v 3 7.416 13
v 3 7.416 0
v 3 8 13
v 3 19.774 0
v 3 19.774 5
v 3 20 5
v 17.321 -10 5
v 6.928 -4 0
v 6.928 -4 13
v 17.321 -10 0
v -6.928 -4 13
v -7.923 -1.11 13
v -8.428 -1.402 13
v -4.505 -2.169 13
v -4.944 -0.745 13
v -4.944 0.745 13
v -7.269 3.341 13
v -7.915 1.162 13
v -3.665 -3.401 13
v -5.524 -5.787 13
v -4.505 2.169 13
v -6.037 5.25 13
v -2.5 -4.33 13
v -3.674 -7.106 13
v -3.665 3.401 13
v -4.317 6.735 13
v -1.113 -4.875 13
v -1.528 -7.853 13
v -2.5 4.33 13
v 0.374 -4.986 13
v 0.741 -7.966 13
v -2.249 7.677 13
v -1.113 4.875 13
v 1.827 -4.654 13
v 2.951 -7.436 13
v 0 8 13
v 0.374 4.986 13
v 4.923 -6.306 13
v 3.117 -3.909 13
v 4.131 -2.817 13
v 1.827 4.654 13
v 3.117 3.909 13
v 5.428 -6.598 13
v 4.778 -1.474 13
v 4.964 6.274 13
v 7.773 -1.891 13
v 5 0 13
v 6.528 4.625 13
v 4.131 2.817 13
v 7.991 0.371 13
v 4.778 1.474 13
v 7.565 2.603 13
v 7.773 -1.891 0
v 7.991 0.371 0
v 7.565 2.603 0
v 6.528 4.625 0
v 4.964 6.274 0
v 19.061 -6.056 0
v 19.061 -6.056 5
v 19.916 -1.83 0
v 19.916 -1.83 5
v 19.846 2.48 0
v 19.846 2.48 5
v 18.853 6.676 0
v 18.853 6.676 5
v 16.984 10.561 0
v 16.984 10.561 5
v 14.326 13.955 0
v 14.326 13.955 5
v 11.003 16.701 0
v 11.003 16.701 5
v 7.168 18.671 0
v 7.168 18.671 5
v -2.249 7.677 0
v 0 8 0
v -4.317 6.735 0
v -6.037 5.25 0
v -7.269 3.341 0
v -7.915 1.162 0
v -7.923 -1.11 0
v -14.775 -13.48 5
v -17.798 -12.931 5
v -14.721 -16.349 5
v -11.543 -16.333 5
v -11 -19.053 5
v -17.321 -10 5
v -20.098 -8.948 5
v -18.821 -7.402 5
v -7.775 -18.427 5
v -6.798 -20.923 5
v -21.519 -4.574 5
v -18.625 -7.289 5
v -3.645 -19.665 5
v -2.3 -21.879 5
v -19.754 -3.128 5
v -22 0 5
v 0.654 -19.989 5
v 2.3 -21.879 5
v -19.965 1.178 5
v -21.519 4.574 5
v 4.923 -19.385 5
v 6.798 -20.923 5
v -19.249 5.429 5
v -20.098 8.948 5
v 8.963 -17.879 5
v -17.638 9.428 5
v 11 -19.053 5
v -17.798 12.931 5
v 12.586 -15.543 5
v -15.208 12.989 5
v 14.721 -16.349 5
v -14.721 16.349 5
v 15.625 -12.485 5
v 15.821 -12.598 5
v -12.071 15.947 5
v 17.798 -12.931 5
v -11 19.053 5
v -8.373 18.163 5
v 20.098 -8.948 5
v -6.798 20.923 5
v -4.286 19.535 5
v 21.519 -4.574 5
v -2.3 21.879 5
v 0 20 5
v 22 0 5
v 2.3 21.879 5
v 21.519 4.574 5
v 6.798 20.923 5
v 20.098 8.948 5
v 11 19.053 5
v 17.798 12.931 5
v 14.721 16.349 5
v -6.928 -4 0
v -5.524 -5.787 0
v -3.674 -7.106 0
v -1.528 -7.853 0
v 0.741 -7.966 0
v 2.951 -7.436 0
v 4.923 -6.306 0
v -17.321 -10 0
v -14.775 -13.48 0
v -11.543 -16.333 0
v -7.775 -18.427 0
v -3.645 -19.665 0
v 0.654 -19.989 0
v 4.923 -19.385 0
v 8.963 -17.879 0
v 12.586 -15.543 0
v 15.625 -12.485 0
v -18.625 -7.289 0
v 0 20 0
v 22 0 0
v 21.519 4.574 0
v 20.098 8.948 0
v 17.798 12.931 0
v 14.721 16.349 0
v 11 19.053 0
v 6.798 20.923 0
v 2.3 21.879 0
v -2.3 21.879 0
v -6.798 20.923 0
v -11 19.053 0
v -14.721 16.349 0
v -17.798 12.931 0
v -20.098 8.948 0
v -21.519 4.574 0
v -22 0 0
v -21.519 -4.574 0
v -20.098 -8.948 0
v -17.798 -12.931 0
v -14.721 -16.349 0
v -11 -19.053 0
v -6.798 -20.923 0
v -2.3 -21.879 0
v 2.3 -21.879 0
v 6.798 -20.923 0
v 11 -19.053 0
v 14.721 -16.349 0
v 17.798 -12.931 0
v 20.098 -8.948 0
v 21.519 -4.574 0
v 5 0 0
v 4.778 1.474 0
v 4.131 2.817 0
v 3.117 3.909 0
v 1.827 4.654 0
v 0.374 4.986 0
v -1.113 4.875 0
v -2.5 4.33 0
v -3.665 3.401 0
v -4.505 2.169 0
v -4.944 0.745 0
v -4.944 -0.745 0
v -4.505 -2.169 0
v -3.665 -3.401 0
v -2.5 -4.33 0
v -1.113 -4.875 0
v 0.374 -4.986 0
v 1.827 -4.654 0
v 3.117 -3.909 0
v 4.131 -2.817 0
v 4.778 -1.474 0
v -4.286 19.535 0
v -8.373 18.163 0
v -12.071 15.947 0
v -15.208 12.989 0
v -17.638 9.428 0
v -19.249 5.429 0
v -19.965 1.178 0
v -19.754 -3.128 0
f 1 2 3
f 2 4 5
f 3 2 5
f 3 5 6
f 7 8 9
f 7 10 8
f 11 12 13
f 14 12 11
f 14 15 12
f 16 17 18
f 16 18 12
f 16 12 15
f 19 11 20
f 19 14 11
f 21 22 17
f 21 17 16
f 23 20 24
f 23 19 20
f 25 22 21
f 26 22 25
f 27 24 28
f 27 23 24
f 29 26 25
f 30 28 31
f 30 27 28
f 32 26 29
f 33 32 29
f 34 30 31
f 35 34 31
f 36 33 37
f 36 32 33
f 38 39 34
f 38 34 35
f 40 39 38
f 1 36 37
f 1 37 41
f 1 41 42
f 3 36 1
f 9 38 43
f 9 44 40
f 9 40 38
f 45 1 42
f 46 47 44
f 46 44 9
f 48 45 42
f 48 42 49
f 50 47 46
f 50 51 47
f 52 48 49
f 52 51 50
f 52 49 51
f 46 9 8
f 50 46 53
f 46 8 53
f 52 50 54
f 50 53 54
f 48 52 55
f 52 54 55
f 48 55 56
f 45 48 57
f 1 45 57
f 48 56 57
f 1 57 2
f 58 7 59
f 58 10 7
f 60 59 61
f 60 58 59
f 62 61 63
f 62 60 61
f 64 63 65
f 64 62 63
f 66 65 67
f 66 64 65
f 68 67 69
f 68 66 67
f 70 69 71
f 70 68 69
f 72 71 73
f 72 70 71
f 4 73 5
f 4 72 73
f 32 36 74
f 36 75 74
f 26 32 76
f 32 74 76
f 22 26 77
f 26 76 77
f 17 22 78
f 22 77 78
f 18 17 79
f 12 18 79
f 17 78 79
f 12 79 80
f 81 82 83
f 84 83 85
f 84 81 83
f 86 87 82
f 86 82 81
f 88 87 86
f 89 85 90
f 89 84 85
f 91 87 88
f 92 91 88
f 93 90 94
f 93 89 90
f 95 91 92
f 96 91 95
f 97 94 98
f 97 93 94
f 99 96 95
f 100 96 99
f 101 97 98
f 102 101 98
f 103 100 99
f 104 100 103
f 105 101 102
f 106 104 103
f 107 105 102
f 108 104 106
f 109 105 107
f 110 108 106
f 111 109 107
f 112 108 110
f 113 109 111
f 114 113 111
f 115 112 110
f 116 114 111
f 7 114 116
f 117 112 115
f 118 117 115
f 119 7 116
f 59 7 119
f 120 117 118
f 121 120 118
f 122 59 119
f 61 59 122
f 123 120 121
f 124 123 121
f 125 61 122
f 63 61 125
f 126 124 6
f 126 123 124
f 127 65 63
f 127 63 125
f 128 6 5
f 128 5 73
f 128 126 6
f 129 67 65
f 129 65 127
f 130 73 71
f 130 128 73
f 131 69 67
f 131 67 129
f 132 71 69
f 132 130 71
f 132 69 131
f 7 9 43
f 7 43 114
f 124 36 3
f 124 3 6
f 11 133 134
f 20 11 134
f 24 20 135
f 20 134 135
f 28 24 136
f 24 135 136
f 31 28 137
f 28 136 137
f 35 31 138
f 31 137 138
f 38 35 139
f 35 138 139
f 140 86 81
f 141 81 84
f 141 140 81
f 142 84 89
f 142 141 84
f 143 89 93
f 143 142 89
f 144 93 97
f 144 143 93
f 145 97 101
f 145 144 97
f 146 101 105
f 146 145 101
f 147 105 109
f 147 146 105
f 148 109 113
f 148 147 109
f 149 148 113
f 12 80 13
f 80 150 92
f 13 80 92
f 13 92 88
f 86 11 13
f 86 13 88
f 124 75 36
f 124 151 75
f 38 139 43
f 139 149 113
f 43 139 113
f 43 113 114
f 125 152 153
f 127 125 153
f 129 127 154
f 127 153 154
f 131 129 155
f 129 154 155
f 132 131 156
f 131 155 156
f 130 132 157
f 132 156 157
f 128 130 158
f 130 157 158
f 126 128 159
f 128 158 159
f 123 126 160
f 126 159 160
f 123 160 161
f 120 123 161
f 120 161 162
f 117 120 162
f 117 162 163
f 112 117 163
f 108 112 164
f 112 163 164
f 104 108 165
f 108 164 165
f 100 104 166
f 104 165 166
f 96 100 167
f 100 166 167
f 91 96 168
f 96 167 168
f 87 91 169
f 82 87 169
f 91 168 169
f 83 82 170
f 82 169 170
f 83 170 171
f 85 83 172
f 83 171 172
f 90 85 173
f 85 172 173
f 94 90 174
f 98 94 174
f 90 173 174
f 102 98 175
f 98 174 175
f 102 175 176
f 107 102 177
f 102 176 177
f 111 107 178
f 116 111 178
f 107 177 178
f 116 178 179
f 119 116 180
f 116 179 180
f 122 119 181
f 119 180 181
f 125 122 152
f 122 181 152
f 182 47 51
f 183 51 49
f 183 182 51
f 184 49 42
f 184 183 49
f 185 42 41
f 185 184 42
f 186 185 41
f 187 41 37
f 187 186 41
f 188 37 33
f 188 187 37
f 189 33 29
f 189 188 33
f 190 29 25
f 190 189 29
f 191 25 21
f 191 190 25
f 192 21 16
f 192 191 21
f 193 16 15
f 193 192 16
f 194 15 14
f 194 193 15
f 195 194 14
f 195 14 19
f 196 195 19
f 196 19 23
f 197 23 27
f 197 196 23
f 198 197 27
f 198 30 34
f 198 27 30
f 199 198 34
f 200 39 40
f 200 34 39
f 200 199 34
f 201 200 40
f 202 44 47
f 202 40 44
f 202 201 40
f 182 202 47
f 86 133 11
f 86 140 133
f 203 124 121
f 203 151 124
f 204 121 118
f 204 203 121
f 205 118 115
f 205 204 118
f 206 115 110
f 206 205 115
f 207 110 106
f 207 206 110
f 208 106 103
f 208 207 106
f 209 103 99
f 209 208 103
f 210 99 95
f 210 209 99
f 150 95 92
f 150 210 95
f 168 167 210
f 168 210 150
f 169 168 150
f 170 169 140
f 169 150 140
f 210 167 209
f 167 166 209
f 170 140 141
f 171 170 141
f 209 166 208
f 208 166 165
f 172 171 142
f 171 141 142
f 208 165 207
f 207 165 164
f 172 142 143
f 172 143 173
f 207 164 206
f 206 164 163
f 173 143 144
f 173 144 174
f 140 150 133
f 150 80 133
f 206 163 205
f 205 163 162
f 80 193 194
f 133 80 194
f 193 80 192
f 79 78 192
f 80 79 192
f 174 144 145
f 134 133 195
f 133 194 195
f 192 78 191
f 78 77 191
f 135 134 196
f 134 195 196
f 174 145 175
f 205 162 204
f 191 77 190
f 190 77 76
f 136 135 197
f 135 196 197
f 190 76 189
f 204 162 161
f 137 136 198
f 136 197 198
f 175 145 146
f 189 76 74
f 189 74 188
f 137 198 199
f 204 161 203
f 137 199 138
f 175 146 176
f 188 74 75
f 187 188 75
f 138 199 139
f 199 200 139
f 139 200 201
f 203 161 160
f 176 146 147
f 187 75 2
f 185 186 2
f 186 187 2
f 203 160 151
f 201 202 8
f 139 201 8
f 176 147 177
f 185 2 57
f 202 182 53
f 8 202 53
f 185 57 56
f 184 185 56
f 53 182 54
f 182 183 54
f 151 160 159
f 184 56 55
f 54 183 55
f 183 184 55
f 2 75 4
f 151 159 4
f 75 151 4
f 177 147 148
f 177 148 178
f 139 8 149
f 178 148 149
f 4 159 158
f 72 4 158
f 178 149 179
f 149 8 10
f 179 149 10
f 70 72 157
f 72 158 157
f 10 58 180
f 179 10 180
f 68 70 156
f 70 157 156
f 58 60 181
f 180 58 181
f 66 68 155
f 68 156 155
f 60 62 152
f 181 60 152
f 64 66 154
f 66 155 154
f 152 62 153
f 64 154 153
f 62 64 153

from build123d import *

# Parameters (mm, degrees)
SKETCH7_R            = 22
SKETCH7_R_2          = 20
BOSS_EXTRUDE7_DEPTH  = 5
SKETCH8_R            = 8
SKETCH8_R_2          = 5
BOSS_EXTRUDE8_DEPTH  = 13
BOSS_EXTRUDE10_DEPTH = 3
CIRPATTERN2_COUNT    = 3


with BuildPart() as part:
    # Sketch7 → Boss-Extrude7 (new body)
    with BuildSketch(Plane.XY):
        Circle(SKETCH7_R)
        Circle(SKETCH7_R_2, mode=Mode.SUBTRACT)
    extrude(amount=BOSS_EXTRUDE7_DEPTH)



with BuildPart() as body_2:
    # Sketch8 → Boss-Extrude8 (new body)
    with BuildSketch(Plane.XY):
        Circle(SKETCH8_R)
        Circle(SKETCH8_R_2, mode=Mode.SUBTRACT)
    extrude(amount=BOSS_EXTRUDE8_DEPTH)


with BuildPart() as part_1:
    add(part.part)

    add(body_2.part)  # Boss-Extrude10 merges body 2
    # Sketch9 → Boss-Extrude10 (add)
    with BuildSketch(Plane(origin=(0, 0, 0), x_dir=(0, 0, -1), z_dir=(1, 0, 0))):
        Polygon((-13, 8), (-5, 20), (0, 20), (0, 8), (0, 5), (-13, 5), align=None)
    boss_extrude10 = extrude(amount=BOSS_EXTRUDE10_DEPTH)

    # CirPattern2: Boss-Extrude10 ×3 about axis
    cirpattern2_axis = Axis((0, 0, 0), (0, 0, 1))
    for i in range(1, CIRPATTERN2_COUNT):
        add(boss_extrude10.rotate(cirpattern2_axis, i * 360 / CIRPATTERN2_COUNT))


solid = part_1.part
